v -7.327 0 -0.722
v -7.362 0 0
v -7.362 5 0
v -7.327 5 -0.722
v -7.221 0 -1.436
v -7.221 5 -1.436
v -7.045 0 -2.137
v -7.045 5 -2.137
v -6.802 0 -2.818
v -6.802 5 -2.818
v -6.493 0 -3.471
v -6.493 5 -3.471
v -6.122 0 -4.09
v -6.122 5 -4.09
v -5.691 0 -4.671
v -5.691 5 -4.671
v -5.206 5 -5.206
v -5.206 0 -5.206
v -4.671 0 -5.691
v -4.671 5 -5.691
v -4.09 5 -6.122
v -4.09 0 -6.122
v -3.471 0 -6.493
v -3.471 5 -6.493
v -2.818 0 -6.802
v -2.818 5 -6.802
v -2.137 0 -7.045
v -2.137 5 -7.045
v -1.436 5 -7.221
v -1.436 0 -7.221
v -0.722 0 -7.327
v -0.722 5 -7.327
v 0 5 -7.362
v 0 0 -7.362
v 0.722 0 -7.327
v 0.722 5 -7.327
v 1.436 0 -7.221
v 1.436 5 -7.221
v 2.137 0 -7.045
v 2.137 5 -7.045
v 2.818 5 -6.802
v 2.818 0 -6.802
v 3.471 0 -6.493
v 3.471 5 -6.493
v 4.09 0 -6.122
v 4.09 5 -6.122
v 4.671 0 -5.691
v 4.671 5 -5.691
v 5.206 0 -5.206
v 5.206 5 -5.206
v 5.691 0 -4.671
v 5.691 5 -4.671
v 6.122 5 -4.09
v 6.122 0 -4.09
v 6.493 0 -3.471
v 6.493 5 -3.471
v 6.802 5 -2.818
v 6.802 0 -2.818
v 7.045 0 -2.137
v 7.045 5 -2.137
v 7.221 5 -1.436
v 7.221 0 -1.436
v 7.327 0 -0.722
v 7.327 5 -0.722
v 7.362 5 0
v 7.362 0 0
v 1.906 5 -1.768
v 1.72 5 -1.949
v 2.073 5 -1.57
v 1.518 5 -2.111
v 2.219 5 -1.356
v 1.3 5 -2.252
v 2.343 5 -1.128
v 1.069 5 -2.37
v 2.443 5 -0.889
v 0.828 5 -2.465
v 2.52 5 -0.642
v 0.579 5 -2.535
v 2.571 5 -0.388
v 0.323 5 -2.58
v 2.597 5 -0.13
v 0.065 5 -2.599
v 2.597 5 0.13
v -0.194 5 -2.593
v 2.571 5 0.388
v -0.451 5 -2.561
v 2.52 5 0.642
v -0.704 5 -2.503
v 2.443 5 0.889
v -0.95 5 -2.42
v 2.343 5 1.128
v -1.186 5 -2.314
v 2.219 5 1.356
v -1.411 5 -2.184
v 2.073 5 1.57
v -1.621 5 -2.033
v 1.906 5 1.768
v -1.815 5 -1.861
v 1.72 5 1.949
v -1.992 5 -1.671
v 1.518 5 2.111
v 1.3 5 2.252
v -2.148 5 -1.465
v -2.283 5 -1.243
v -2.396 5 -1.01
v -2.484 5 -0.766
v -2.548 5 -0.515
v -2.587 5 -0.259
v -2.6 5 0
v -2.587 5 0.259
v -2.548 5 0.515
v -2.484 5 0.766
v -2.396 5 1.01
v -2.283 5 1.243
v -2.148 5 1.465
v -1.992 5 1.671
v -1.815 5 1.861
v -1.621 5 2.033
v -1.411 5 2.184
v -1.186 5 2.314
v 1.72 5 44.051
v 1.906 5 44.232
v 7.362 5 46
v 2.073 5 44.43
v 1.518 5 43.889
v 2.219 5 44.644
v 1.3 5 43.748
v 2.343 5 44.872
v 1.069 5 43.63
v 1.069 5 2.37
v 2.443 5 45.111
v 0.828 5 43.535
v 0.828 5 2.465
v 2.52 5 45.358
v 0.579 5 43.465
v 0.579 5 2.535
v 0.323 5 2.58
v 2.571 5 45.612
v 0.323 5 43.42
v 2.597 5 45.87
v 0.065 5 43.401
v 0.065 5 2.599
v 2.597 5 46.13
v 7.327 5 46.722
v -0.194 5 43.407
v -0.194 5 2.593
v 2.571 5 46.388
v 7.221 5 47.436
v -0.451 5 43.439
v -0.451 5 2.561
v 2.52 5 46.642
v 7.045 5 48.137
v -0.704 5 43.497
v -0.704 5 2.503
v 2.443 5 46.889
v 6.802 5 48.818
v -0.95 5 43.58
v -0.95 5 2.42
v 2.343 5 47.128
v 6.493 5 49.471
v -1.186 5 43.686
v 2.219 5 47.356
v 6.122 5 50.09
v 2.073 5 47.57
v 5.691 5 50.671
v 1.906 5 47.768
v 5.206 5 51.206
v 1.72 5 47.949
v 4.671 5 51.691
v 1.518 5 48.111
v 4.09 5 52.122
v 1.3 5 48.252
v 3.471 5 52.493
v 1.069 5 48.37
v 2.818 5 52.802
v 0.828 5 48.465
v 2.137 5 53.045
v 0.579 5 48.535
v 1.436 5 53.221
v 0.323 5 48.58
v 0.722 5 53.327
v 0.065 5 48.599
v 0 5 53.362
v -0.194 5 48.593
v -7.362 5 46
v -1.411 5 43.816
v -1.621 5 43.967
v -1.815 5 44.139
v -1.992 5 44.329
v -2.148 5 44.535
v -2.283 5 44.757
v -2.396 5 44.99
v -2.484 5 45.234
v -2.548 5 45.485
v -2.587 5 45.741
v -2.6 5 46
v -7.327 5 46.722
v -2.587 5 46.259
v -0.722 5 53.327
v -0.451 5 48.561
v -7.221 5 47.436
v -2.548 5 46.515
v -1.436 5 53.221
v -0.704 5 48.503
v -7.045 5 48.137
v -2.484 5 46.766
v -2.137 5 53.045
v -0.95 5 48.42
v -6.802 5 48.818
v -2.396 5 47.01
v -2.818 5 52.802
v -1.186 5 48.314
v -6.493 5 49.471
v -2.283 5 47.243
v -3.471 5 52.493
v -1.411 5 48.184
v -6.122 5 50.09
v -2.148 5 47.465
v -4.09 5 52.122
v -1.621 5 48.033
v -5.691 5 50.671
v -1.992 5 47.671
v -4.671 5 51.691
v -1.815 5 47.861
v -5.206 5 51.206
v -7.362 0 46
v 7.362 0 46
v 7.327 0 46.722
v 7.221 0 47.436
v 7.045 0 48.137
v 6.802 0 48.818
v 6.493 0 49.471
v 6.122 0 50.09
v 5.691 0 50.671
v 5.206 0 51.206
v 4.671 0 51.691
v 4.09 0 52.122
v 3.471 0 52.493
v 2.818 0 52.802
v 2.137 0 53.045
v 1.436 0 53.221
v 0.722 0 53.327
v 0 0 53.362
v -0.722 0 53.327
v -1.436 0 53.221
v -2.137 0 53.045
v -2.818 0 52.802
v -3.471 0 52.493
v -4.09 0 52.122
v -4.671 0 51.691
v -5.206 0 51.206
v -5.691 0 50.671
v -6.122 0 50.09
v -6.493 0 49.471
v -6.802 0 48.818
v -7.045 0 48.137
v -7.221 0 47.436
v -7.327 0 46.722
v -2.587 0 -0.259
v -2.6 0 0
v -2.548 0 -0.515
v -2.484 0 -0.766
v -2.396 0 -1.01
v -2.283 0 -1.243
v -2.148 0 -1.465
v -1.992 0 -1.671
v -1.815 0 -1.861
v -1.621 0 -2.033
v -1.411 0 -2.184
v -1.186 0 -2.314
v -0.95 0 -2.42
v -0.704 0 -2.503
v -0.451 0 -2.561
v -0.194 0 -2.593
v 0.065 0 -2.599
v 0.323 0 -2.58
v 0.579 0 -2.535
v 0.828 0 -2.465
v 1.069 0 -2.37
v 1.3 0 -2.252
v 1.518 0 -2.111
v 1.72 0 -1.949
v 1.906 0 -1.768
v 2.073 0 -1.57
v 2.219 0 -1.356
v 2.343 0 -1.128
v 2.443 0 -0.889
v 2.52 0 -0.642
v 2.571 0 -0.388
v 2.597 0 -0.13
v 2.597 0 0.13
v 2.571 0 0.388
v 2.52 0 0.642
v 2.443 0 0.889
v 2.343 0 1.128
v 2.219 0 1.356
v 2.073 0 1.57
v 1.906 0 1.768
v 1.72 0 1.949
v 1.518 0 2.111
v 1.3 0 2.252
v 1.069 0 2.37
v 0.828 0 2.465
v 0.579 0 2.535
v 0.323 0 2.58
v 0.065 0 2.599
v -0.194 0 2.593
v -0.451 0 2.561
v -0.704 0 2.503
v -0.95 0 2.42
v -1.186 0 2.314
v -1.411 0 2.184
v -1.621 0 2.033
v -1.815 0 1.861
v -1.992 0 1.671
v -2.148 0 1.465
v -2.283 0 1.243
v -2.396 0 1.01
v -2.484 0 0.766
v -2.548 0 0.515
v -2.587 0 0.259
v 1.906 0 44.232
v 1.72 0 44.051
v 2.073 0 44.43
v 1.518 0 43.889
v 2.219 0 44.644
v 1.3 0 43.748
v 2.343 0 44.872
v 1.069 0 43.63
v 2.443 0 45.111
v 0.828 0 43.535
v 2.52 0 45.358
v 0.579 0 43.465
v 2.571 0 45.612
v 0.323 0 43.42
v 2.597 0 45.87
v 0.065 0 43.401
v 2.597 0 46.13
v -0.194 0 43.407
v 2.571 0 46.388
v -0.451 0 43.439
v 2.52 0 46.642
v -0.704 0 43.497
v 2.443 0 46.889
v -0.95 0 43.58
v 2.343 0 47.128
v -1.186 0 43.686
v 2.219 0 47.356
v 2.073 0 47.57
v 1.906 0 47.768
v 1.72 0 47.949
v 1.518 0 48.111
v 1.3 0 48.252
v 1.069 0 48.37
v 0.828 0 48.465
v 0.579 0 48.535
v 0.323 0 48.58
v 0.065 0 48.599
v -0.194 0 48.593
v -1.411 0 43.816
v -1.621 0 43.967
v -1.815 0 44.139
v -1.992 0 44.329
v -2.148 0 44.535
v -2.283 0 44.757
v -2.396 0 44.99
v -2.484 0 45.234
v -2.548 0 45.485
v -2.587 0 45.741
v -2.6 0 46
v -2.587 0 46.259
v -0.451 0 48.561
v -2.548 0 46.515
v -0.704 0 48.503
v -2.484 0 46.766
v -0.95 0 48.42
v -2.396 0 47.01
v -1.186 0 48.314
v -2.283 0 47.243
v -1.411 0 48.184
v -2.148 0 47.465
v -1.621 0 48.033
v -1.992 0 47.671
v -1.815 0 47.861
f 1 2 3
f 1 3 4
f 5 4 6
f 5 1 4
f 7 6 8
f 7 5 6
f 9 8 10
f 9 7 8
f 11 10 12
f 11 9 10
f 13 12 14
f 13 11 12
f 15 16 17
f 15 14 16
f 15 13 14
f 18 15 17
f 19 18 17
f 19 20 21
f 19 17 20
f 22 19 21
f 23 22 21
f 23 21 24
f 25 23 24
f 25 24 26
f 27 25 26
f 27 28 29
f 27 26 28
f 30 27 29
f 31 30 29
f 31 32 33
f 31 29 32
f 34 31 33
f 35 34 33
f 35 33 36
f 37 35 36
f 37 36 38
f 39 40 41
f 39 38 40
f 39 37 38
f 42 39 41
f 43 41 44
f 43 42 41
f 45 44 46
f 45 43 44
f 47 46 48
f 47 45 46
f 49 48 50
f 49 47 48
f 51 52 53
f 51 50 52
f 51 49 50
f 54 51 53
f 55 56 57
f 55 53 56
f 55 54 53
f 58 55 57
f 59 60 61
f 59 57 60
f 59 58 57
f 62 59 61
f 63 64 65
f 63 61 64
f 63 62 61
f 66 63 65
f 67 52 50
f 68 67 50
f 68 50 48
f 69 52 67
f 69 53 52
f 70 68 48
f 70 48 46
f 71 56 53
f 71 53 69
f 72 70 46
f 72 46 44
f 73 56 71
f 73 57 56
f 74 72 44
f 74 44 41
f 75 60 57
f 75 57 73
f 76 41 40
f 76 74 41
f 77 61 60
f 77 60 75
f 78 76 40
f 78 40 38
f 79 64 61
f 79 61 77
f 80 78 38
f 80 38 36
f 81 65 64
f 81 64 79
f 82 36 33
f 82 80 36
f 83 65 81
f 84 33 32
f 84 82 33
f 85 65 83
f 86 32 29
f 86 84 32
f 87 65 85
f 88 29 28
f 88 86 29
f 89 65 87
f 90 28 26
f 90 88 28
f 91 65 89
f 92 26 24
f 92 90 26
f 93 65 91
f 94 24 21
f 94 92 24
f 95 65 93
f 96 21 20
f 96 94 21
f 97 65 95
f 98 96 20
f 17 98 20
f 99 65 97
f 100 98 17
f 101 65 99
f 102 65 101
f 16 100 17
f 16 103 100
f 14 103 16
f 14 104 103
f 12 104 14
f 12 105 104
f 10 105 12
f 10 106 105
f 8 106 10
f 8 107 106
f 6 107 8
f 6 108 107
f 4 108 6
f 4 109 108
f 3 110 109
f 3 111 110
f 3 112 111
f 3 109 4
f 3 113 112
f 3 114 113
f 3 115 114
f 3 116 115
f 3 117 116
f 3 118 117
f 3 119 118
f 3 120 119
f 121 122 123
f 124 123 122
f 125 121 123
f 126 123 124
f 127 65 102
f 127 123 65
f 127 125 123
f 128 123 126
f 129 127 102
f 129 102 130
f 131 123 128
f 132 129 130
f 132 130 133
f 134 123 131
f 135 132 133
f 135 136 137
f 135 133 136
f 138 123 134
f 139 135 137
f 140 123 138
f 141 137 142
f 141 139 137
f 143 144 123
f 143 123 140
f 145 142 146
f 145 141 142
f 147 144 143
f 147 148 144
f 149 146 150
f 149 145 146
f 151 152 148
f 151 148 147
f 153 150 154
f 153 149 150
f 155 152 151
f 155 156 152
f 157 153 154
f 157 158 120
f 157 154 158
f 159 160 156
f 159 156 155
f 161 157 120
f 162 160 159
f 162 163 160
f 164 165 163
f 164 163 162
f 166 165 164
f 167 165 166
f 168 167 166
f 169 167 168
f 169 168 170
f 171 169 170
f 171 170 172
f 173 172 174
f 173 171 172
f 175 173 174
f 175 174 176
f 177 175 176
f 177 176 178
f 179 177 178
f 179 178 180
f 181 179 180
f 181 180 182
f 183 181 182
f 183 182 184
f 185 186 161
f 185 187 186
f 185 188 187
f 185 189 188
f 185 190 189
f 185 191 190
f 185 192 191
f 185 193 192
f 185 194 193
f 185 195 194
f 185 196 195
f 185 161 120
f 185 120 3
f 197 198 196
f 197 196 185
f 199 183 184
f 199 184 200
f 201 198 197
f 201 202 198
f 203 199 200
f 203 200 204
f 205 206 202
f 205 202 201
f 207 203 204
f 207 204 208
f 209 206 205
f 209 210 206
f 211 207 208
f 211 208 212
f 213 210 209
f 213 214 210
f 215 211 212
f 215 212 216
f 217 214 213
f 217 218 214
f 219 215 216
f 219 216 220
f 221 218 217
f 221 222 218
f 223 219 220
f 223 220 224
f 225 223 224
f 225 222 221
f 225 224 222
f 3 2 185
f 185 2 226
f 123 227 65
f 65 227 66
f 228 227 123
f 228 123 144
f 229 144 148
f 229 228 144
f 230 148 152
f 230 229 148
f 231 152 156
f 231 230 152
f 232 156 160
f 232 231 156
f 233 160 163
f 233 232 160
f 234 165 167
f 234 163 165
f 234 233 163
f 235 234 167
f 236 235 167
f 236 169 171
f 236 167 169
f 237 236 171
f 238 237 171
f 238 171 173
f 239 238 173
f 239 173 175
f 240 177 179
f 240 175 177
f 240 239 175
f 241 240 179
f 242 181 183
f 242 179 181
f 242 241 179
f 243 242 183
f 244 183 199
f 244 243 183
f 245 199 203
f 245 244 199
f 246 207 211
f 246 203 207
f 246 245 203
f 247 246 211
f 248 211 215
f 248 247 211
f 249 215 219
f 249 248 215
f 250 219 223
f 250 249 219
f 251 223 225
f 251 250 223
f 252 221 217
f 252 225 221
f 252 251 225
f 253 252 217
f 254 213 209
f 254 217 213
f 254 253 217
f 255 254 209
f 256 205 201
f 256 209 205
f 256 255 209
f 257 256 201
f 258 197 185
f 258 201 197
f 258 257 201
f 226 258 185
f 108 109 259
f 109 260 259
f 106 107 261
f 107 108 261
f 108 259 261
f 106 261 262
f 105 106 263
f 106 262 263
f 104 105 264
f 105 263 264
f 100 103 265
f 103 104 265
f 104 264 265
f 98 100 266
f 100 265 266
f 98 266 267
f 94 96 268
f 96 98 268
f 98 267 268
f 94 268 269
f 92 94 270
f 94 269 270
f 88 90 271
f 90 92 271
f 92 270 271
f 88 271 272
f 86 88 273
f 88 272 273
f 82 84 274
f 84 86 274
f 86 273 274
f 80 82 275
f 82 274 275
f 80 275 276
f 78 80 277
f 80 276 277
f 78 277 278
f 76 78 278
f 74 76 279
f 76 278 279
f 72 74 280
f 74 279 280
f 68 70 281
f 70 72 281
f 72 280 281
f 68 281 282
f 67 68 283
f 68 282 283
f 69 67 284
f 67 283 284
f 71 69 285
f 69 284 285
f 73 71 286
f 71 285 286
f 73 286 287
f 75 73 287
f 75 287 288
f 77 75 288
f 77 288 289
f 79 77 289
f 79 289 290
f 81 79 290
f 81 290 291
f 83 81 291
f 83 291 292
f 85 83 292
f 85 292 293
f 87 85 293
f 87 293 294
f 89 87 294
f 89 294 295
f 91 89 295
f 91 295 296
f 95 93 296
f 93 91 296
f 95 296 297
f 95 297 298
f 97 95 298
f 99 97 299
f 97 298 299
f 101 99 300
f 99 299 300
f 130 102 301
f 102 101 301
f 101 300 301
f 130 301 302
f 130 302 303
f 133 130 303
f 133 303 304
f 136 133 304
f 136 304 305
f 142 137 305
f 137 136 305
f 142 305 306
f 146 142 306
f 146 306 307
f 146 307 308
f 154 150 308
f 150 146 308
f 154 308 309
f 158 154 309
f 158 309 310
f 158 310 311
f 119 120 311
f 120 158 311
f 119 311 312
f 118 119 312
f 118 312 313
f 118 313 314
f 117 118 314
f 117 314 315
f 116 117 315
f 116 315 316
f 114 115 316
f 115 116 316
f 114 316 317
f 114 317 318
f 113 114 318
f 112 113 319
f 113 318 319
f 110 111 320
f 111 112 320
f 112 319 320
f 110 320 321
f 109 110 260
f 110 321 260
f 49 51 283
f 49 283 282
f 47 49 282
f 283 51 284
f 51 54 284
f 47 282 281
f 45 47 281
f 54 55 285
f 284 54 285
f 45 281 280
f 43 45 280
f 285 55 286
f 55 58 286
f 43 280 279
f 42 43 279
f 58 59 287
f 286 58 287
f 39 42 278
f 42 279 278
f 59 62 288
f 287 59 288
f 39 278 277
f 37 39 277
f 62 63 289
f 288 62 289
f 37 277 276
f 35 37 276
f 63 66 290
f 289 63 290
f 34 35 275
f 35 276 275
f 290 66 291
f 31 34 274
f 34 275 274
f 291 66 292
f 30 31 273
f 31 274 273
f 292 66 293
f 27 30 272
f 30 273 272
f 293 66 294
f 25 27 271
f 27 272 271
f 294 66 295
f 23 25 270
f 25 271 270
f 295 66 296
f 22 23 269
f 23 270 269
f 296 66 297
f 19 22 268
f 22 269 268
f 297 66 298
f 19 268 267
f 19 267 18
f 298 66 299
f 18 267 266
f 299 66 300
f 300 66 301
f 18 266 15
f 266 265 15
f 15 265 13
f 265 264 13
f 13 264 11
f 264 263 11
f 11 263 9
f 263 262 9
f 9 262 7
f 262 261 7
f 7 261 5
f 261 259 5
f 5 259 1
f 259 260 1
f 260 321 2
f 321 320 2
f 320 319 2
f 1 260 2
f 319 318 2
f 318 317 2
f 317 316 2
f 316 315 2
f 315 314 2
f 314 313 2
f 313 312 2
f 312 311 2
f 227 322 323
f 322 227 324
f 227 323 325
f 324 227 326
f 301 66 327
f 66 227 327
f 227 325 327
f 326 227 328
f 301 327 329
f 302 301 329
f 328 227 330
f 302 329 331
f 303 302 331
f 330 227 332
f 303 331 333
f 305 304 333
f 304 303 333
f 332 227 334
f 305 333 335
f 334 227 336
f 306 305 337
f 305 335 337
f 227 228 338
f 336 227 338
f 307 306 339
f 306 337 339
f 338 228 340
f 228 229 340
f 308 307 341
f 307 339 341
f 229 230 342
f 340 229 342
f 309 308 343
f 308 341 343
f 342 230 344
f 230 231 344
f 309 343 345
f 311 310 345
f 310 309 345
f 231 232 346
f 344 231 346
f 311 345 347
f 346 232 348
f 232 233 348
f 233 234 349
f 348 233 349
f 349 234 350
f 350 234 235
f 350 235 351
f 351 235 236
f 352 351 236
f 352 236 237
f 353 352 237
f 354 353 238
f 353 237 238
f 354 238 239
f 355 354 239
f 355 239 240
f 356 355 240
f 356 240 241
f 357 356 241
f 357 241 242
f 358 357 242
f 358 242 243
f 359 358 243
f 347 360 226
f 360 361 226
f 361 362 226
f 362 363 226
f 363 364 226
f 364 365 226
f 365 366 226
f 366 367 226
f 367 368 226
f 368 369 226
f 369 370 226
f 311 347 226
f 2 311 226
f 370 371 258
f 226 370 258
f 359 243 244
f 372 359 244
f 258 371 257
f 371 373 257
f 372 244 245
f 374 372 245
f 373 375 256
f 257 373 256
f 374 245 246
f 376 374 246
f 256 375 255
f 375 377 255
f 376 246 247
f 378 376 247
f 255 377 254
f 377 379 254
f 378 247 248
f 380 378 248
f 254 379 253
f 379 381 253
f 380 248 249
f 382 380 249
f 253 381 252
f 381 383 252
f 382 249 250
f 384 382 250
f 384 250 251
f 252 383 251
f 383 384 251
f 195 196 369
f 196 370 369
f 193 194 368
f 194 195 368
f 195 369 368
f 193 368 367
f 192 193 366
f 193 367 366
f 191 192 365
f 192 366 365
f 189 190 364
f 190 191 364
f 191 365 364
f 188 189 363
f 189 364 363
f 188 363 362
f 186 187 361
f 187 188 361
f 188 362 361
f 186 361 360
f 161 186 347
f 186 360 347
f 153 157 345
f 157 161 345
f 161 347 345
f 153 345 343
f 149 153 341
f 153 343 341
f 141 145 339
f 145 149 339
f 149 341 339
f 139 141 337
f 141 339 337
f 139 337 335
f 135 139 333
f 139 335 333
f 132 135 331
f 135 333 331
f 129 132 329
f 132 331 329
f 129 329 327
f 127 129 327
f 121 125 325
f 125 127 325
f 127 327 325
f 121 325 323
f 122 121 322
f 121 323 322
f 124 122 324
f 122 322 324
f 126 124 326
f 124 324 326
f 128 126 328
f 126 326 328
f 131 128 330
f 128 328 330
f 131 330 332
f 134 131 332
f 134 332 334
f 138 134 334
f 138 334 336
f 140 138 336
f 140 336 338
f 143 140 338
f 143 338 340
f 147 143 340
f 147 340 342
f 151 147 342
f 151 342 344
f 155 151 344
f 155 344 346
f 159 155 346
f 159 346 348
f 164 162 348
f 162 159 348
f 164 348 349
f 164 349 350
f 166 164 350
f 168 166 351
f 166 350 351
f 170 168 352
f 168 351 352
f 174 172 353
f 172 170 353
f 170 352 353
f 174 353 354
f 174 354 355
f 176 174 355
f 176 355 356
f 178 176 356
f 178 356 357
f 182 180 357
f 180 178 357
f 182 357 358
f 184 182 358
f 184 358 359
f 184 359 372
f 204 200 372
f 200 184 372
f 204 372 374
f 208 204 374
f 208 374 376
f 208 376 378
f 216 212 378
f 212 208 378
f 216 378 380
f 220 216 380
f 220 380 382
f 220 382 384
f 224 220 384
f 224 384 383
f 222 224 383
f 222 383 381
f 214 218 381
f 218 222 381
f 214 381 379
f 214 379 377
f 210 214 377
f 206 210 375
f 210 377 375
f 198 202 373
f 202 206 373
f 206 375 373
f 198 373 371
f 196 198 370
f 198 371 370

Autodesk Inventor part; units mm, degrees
ref_plane "YZ Plane" through (0, 0, 0) normal (1, 0, 0) x (0, 1, 0)
ref_plane "XZ Plane" through (0, 0, 0) normal (0, 1, 0) x (-1, 0, 0)
ref_plane "XY Plane" through (0, 0, 0) normal (0, 0, 1) x (1, 0, 0)
sketch "Sketch1" plane through (0, 0, 0) normal (0, 1, 0) x (-1, 0, 0)
  circle A0 centre (0, 0) radius 2.6
  circle A1 centre (0, 0) radius 7.3625 construction
  circle A2 centre (0, 46) radius 2.6
  circle A3 centre (0, 46) radius 7.3625 construction
  line L0 (7.3625, 0) -> (7.3625, 46)
  line L1 (-7.3625, 46) -> (-7.3625, 0)
  arc A4 (-7.3625, 0) -> (7.3625, 0) centre (0, 0) ccw
  arc A5 (7.3625, 46) -> (-7.3625, 46) centre (0, 46) ccw
  dimension "d0" = 5.2
  dimension "d1" = 4.7625
  dimension "d2" = 46
extrude "Extrusion1" add sketch "Sketch1" along normal blind 5
properties part number "CNC-019-ZAxisBallScrewStabilizerShim2" material "ABS Plastic"
